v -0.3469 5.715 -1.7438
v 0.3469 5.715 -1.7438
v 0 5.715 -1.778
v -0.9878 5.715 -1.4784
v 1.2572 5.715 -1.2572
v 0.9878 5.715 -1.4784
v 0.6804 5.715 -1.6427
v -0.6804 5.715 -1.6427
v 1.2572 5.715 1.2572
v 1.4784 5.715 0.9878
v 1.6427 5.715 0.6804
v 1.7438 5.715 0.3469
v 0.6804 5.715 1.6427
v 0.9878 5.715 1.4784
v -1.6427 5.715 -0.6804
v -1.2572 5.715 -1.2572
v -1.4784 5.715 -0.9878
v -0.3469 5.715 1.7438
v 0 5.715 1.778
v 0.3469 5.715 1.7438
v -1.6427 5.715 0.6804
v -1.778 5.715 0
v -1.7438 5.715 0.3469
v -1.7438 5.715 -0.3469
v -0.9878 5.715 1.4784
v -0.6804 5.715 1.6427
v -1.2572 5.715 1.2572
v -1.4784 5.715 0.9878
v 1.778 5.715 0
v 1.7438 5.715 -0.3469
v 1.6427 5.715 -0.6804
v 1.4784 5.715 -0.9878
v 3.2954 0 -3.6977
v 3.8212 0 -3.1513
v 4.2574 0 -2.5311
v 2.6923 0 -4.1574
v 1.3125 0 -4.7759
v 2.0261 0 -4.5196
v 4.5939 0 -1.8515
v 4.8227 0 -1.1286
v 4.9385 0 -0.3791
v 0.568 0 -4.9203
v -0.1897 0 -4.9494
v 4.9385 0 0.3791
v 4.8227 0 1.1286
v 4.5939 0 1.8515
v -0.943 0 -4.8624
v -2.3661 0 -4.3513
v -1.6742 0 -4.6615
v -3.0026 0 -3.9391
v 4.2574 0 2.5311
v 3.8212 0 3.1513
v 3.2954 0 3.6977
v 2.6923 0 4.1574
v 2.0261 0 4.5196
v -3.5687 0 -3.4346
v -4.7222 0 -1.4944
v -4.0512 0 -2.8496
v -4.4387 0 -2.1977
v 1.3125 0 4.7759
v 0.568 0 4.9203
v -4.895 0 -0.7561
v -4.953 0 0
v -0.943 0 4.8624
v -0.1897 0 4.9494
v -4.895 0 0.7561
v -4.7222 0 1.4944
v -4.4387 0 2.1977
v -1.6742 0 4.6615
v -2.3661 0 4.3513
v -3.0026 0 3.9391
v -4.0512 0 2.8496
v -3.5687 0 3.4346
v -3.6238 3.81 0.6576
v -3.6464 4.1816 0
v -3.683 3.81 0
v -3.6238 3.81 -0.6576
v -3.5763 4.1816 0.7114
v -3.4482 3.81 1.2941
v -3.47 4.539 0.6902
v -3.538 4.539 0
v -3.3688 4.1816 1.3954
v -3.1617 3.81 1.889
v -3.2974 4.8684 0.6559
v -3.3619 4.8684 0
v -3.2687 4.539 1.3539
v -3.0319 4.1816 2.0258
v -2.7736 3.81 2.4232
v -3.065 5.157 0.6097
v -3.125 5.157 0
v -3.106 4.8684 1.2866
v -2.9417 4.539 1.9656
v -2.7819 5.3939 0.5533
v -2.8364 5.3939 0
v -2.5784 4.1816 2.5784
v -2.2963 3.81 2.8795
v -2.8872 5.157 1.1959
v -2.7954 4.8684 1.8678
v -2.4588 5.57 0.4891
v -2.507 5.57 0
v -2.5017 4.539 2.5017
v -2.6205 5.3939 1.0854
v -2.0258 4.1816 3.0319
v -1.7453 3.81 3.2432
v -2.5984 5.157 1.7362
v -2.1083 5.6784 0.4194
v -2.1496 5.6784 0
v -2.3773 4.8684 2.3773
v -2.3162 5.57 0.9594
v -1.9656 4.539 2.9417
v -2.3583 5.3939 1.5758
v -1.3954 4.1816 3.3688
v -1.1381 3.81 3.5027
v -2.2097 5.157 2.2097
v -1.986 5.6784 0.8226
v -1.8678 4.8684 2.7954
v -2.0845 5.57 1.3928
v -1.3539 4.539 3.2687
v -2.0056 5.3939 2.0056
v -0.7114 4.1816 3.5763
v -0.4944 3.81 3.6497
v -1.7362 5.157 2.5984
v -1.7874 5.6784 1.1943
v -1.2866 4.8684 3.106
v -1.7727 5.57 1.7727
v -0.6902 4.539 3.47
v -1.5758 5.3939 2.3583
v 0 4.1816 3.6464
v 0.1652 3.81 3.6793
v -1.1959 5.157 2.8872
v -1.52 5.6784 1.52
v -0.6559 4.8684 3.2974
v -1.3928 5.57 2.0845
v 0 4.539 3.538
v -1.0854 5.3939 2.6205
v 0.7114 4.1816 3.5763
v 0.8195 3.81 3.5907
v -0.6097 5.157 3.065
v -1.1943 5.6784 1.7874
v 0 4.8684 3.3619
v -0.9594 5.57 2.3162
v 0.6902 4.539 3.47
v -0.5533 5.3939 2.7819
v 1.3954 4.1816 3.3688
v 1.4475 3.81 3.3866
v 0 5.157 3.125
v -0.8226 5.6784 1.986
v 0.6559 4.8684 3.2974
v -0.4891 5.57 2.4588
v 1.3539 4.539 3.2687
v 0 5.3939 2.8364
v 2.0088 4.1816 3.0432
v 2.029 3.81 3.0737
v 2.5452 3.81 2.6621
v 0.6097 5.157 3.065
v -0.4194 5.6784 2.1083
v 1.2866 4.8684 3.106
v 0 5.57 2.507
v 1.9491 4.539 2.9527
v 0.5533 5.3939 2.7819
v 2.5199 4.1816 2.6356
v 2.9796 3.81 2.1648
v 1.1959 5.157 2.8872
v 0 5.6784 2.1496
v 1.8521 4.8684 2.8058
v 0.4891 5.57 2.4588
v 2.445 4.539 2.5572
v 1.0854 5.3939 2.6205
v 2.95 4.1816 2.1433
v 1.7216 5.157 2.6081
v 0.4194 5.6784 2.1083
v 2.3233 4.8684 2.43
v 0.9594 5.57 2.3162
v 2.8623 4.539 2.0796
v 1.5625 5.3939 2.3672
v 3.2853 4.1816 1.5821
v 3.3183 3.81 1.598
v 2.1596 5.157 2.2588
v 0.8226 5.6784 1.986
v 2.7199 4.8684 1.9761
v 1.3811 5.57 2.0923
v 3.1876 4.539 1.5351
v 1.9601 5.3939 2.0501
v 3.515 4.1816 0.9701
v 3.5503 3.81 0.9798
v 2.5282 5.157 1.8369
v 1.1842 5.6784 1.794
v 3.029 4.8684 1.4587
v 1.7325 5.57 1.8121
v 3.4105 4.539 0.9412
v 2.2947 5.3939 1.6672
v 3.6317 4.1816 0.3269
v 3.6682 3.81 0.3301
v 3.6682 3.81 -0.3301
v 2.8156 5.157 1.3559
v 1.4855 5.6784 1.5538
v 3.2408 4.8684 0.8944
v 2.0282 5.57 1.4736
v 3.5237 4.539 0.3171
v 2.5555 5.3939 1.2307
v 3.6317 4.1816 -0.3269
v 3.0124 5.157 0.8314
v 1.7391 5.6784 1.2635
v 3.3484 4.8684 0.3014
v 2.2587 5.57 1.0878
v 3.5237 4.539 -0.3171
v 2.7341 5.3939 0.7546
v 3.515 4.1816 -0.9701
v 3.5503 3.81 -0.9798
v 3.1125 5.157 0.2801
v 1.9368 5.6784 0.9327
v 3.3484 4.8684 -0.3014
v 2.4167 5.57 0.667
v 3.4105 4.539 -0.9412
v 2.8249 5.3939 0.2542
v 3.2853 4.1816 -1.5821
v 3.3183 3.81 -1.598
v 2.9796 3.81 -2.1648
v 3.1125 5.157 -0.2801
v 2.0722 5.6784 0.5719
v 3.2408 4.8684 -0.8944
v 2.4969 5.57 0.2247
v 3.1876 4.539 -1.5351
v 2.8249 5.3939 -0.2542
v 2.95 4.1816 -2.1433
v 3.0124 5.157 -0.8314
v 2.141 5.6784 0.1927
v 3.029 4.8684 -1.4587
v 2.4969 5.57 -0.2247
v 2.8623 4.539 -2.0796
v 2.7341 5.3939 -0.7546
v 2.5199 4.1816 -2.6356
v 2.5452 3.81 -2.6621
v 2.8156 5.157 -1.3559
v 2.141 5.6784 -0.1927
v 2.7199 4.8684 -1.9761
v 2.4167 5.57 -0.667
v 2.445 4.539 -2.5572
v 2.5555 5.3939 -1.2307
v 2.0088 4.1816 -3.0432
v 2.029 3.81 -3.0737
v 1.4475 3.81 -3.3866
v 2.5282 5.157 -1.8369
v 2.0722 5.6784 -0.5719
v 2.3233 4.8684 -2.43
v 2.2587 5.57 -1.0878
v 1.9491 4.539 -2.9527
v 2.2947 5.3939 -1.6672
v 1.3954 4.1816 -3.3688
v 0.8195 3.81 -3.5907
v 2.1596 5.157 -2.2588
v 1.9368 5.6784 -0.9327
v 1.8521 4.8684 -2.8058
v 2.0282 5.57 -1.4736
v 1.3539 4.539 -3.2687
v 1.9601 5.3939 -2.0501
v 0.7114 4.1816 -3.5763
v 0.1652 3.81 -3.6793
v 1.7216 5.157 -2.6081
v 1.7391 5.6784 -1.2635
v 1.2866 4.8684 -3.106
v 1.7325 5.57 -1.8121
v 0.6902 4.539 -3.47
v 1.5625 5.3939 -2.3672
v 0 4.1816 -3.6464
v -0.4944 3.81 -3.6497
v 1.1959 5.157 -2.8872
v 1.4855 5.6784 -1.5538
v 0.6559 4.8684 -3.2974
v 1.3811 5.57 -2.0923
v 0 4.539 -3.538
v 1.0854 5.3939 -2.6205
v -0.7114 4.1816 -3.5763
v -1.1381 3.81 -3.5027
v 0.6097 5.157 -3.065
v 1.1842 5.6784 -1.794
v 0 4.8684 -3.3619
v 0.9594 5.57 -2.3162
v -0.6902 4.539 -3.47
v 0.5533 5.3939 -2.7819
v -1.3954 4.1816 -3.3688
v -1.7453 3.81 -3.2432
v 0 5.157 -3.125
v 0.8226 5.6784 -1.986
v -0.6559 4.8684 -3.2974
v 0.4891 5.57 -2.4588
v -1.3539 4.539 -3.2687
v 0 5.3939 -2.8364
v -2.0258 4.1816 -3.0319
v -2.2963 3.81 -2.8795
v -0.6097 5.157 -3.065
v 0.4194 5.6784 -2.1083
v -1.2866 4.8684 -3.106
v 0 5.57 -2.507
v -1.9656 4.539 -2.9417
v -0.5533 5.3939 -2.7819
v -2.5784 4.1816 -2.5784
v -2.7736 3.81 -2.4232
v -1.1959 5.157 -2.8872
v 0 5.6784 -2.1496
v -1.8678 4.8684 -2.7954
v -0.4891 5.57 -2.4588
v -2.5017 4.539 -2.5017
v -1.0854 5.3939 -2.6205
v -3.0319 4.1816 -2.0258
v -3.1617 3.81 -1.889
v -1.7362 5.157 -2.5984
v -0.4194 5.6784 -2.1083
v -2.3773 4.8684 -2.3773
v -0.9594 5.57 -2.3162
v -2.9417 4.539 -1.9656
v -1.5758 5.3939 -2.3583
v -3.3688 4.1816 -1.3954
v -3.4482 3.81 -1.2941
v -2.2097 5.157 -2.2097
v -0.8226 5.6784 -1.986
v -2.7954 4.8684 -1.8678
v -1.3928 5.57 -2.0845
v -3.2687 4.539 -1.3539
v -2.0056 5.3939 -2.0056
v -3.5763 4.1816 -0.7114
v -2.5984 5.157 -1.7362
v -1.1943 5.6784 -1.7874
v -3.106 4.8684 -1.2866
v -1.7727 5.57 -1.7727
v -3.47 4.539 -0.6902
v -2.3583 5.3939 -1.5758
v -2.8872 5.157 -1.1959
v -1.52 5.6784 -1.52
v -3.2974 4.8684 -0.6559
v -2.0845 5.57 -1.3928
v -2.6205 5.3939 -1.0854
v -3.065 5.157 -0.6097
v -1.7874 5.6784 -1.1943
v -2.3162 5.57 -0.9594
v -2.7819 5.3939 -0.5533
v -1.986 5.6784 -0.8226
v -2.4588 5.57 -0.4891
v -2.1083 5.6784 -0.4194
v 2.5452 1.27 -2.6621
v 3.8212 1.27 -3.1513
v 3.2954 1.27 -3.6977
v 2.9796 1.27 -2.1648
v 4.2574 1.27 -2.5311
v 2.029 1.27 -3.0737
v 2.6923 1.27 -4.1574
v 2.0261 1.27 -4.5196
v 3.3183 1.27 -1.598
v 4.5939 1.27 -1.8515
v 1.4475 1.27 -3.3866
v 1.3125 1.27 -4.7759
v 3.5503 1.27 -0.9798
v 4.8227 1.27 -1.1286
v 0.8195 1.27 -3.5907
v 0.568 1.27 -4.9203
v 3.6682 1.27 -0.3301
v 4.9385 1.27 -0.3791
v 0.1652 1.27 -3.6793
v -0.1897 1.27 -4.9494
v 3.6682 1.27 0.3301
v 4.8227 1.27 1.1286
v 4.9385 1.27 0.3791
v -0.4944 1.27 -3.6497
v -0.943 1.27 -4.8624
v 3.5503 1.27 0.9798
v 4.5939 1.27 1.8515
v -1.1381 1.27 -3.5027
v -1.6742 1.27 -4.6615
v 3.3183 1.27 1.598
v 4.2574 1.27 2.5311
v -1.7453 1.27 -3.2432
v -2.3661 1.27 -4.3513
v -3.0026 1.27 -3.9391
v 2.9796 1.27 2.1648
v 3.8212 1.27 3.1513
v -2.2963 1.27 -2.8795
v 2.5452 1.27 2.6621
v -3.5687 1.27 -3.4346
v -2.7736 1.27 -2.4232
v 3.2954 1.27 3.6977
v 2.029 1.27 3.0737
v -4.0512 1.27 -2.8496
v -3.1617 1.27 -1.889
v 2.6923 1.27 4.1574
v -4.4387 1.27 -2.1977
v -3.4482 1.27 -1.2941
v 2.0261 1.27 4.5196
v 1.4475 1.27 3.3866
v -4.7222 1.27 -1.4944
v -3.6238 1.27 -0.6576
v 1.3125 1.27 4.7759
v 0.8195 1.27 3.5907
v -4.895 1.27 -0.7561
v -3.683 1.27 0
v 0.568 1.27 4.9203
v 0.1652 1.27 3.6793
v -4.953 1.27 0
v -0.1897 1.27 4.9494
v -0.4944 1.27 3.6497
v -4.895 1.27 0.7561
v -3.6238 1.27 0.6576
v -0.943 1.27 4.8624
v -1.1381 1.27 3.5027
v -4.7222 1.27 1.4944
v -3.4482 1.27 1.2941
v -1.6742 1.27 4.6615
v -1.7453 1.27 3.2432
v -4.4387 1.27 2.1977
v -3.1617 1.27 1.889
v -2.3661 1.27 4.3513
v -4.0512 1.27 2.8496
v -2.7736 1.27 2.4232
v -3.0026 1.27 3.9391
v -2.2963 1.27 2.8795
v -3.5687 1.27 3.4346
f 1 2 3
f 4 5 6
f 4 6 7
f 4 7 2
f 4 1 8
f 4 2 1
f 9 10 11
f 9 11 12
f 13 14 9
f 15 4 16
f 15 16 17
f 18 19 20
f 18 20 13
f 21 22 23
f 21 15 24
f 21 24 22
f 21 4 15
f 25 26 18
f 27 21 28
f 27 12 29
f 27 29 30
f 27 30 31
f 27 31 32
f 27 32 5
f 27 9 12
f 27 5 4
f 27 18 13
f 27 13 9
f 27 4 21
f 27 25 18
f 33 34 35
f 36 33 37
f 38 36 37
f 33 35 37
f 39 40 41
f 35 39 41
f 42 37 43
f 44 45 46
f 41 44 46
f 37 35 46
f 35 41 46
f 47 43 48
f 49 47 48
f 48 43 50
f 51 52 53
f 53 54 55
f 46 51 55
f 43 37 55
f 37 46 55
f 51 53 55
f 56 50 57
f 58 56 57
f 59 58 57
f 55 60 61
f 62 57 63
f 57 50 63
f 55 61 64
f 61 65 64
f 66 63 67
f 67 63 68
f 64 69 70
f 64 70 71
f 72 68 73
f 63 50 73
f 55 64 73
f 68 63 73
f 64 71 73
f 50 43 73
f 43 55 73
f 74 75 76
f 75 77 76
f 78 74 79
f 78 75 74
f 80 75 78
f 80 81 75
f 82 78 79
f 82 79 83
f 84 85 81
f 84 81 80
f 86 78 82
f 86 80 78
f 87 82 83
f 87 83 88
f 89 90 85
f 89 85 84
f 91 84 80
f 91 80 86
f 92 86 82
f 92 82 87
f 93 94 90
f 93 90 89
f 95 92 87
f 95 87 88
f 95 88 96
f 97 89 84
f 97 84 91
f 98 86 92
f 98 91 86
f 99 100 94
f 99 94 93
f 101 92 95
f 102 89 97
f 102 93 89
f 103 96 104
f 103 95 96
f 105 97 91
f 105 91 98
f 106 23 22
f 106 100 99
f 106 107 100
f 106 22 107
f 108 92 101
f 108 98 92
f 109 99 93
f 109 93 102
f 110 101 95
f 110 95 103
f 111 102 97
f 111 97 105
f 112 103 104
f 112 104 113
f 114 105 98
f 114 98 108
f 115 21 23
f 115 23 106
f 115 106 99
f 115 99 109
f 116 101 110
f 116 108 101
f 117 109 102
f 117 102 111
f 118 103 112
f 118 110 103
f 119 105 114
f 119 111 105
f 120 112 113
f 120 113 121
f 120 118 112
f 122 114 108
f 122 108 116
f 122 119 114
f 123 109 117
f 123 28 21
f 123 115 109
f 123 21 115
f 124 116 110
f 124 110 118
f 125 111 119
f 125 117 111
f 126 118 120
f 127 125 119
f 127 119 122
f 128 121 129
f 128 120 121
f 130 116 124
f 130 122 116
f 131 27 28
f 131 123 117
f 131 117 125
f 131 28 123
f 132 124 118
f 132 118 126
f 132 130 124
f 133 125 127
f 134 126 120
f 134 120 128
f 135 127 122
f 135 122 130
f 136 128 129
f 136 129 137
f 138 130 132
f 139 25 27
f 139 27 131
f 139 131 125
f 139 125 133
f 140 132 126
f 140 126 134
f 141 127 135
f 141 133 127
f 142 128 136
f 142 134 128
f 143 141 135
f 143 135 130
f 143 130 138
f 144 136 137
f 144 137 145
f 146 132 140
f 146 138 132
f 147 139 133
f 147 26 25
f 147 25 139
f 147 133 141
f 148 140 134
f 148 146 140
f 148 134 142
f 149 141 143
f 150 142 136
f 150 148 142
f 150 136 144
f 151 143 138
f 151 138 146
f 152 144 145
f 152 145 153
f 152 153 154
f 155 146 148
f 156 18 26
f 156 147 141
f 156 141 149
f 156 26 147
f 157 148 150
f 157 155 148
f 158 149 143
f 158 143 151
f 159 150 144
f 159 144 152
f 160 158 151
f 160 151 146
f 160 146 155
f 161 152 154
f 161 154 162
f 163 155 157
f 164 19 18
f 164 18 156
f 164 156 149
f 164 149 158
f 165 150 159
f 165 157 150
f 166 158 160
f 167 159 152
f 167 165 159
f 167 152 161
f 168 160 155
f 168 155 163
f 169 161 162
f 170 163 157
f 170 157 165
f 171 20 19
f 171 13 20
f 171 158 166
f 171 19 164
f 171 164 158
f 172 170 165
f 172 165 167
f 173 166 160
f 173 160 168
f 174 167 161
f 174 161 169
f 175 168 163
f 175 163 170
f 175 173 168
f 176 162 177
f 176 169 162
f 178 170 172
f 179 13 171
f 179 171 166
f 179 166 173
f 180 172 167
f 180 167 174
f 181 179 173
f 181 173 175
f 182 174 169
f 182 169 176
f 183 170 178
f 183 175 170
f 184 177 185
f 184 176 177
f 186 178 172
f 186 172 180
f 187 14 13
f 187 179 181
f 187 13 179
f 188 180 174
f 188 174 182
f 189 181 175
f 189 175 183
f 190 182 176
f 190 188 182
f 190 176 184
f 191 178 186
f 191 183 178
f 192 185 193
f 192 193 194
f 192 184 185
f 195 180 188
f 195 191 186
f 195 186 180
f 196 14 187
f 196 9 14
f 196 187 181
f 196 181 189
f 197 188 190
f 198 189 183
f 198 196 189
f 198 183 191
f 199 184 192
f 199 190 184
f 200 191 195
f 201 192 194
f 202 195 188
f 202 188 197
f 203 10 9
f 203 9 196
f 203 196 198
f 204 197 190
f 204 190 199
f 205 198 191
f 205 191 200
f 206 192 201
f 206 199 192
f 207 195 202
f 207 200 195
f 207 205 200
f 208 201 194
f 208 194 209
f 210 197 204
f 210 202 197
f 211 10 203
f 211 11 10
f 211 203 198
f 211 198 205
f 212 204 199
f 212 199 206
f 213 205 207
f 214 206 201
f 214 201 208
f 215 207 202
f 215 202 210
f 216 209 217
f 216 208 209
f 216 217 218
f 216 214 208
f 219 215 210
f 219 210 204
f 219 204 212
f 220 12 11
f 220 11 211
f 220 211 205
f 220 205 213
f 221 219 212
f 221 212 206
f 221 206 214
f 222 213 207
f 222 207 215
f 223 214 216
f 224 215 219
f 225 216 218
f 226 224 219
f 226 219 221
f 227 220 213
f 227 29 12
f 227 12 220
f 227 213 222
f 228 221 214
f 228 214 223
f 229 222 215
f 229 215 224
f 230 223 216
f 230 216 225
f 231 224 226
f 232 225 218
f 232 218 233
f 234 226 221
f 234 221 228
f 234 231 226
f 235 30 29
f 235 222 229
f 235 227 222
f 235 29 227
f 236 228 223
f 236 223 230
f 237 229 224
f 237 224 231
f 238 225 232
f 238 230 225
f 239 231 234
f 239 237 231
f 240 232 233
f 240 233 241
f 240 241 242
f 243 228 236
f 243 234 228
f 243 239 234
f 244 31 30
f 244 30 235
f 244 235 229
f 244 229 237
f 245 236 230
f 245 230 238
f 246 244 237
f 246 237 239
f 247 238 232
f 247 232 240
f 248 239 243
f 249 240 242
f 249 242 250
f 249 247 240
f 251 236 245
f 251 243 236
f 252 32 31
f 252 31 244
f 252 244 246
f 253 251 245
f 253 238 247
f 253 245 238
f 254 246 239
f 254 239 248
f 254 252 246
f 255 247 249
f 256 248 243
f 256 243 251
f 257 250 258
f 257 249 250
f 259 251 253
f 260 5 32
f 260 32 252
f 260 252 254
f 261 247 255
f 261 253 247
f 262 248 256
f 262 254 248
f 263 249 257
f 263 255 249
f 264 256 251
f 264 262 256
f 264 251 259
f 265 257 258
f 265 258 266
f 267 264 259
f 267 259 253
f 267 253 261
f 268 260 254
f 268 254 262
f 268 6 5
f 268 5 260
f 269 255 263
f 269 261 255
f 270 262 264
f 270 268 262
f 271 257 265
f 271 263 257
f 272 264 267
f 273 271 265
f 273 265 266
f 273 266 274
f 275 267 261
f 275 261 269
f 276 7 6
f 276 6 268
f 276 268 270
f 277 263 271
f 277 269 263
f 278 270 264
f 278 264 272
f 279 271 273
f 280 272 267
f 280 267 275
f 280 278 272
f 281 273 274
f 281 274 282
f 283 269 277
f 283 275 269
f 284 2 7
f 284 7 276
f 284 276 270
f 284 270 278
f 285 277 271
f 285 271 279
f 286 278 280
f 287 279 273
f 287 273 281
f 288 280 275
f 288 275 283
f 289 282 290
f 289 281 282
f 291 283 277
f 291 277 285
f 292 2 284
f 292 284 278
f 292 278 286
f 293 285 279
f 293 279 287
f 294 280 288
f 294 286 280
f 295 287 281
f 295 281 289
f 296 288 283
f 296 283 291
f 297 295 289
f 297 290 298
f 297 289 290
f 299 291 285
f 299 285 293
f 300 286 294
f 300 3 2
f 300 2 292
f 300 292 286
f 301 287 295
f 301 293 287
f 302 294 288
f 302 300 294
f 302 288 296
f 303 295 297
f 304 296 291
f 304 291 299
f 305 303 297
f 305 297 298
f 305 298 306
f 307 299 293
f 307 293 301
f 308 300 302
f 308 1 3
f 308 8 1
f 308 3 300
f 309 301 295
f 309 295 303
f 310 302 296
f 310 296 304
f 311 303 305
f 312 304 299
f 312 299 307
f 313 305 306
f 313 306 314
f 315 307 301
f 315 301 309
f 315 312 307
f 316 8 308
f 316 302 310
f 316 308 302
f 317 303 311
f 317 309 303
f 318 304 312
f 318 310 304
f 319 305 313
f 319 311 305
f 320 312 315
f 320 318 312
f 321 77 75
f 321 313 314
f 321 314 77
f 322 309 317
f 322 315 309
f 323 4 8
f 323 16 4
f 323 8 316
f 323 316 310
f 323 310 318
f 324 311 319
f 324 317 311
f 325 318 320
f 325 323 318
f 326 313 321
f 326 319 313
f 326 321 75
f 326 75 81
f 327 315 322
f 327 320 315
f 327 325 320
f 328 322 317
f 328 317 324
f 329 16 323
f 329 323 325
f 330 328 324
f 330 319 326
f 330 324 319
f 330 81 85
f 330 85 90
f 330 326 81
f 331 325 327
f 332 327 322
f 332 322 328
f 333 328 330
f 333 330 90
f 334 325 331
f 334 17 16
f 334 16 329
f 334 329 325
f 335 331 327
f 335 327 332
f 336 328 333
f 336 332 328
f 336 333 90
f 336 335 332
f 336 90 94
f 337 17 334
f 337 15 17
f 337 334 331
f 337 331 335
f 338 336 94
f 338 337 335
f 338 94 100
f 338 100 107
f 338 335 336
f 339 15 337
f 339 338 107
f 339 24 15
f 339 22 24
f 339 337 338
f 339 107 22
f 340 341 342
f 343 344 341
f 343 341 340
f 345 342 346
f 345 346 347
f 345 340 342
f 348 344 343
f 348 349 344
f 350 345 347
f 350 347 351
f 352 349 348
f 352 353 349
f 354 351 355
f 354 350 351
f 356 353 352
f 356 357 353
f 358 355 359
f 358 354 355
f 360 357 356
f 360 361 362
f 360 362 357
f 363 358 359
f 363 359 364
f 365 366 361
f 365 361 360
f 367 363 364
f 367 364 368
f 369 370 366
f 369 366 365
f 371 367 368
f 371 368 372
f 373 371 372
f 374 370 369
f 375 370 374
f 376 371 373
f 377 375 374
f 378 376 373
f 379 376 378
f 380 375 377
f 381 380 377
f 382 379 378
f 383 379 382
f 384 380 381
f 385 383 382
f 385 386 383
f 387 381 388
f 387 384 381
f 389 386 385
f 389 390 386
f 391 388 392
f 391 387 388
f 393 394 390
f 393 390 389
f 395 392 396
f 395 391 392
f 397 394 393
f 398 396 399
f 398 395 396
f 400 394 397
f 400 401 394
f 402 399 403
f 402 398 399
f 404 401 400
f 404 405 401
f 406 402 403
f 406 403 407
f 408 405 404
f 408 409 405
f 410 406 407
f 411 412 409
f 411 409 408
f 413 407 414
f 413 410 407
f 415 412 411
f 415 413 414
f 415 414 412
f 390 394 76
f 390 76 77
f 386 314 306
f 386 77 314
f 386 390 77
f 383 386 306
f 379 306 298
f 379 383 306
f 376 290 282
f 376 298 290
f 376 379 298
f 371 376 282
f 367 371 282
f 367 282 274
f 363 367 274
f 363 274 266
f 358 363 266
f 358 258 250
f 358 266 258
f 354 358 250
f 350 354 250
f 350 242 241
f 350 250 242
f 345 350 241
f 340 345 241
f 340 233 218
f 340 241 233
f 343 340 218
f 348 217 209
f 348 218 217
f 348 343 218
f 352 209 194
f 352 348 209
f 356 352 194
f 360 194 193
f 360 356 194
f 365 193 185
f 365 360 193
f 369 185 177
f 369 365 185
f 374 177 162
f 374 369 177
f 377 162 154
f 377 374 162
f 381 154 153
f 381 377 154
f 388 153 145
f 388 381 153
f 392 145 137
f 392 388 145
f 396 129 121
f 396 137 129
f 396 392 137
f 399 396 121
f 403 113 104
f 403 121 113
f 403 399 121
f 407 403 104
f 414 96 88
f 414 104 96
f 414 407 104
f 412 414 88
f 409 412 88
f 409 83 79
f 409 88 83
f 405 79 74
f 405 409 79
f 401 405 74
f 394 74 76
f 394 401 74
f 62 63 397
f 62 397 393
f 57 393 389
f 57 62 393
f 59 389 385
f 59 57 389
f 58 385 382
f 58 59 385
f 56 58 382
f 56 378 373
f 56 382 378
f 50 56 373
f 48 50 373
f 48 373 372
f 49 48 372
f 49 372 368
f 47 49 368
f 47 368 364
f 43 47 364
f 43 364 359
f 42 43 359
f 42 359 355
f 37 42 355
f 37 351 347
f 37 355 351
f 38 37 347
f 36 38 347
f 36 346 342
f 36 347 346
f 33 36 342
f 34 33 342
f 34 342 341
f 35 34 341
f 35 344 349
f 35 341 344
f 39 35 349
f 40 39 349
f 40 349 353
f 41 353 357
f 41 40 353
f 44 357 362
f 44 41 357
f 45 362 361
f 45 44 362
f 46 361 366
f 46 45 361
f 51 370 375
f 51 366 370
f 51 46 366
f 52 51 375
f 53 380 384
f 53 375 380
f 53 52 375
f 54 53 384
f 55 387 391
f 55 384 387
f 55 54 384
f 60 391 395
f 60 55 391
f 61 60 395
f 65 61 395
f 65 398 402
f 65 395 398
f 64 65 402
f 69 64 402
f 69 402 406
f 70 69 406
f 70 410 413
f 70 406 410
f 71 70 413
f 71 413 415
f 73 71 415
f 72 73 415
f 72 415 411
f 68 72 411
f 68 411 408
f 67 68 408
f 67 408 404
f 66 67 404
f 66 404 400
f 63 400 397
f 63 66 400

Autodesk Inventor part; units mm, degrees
ref_plane "YZ Plane" through (0, 0, 0) normal (1, 0, 0) x (0, 1, 0)
ref_plane "XZ Plane" through (0, 0, 0) normal (0, 1, 0) x (-1, 0, 0)
ref_plane "XY Plane" through (0, 0, 0) normal (0, 0, 1) x (1, 0, 0)
sketch "Sketch1" plane through (0, 0, 0) normal (0, 1, 0) x (-1, 0, 0)
  circle A0 centre (0, 0) radius 3.683
  circle A1 centre (0, 0) radius 4.953
  dimension "d0" = 7.366
  dimension "d1" = 9.906
extrude "Extrusion1" add sketch "Sketch1" along normal blind 5.715 contours A0
extrude "Extrusion2" add sketch "Sketch1" along normal blind 1.27
fillet "Fillet1" radius 1.905 1 edges at (3.683, 5.715, 0)
properties part number "Button_switch"
